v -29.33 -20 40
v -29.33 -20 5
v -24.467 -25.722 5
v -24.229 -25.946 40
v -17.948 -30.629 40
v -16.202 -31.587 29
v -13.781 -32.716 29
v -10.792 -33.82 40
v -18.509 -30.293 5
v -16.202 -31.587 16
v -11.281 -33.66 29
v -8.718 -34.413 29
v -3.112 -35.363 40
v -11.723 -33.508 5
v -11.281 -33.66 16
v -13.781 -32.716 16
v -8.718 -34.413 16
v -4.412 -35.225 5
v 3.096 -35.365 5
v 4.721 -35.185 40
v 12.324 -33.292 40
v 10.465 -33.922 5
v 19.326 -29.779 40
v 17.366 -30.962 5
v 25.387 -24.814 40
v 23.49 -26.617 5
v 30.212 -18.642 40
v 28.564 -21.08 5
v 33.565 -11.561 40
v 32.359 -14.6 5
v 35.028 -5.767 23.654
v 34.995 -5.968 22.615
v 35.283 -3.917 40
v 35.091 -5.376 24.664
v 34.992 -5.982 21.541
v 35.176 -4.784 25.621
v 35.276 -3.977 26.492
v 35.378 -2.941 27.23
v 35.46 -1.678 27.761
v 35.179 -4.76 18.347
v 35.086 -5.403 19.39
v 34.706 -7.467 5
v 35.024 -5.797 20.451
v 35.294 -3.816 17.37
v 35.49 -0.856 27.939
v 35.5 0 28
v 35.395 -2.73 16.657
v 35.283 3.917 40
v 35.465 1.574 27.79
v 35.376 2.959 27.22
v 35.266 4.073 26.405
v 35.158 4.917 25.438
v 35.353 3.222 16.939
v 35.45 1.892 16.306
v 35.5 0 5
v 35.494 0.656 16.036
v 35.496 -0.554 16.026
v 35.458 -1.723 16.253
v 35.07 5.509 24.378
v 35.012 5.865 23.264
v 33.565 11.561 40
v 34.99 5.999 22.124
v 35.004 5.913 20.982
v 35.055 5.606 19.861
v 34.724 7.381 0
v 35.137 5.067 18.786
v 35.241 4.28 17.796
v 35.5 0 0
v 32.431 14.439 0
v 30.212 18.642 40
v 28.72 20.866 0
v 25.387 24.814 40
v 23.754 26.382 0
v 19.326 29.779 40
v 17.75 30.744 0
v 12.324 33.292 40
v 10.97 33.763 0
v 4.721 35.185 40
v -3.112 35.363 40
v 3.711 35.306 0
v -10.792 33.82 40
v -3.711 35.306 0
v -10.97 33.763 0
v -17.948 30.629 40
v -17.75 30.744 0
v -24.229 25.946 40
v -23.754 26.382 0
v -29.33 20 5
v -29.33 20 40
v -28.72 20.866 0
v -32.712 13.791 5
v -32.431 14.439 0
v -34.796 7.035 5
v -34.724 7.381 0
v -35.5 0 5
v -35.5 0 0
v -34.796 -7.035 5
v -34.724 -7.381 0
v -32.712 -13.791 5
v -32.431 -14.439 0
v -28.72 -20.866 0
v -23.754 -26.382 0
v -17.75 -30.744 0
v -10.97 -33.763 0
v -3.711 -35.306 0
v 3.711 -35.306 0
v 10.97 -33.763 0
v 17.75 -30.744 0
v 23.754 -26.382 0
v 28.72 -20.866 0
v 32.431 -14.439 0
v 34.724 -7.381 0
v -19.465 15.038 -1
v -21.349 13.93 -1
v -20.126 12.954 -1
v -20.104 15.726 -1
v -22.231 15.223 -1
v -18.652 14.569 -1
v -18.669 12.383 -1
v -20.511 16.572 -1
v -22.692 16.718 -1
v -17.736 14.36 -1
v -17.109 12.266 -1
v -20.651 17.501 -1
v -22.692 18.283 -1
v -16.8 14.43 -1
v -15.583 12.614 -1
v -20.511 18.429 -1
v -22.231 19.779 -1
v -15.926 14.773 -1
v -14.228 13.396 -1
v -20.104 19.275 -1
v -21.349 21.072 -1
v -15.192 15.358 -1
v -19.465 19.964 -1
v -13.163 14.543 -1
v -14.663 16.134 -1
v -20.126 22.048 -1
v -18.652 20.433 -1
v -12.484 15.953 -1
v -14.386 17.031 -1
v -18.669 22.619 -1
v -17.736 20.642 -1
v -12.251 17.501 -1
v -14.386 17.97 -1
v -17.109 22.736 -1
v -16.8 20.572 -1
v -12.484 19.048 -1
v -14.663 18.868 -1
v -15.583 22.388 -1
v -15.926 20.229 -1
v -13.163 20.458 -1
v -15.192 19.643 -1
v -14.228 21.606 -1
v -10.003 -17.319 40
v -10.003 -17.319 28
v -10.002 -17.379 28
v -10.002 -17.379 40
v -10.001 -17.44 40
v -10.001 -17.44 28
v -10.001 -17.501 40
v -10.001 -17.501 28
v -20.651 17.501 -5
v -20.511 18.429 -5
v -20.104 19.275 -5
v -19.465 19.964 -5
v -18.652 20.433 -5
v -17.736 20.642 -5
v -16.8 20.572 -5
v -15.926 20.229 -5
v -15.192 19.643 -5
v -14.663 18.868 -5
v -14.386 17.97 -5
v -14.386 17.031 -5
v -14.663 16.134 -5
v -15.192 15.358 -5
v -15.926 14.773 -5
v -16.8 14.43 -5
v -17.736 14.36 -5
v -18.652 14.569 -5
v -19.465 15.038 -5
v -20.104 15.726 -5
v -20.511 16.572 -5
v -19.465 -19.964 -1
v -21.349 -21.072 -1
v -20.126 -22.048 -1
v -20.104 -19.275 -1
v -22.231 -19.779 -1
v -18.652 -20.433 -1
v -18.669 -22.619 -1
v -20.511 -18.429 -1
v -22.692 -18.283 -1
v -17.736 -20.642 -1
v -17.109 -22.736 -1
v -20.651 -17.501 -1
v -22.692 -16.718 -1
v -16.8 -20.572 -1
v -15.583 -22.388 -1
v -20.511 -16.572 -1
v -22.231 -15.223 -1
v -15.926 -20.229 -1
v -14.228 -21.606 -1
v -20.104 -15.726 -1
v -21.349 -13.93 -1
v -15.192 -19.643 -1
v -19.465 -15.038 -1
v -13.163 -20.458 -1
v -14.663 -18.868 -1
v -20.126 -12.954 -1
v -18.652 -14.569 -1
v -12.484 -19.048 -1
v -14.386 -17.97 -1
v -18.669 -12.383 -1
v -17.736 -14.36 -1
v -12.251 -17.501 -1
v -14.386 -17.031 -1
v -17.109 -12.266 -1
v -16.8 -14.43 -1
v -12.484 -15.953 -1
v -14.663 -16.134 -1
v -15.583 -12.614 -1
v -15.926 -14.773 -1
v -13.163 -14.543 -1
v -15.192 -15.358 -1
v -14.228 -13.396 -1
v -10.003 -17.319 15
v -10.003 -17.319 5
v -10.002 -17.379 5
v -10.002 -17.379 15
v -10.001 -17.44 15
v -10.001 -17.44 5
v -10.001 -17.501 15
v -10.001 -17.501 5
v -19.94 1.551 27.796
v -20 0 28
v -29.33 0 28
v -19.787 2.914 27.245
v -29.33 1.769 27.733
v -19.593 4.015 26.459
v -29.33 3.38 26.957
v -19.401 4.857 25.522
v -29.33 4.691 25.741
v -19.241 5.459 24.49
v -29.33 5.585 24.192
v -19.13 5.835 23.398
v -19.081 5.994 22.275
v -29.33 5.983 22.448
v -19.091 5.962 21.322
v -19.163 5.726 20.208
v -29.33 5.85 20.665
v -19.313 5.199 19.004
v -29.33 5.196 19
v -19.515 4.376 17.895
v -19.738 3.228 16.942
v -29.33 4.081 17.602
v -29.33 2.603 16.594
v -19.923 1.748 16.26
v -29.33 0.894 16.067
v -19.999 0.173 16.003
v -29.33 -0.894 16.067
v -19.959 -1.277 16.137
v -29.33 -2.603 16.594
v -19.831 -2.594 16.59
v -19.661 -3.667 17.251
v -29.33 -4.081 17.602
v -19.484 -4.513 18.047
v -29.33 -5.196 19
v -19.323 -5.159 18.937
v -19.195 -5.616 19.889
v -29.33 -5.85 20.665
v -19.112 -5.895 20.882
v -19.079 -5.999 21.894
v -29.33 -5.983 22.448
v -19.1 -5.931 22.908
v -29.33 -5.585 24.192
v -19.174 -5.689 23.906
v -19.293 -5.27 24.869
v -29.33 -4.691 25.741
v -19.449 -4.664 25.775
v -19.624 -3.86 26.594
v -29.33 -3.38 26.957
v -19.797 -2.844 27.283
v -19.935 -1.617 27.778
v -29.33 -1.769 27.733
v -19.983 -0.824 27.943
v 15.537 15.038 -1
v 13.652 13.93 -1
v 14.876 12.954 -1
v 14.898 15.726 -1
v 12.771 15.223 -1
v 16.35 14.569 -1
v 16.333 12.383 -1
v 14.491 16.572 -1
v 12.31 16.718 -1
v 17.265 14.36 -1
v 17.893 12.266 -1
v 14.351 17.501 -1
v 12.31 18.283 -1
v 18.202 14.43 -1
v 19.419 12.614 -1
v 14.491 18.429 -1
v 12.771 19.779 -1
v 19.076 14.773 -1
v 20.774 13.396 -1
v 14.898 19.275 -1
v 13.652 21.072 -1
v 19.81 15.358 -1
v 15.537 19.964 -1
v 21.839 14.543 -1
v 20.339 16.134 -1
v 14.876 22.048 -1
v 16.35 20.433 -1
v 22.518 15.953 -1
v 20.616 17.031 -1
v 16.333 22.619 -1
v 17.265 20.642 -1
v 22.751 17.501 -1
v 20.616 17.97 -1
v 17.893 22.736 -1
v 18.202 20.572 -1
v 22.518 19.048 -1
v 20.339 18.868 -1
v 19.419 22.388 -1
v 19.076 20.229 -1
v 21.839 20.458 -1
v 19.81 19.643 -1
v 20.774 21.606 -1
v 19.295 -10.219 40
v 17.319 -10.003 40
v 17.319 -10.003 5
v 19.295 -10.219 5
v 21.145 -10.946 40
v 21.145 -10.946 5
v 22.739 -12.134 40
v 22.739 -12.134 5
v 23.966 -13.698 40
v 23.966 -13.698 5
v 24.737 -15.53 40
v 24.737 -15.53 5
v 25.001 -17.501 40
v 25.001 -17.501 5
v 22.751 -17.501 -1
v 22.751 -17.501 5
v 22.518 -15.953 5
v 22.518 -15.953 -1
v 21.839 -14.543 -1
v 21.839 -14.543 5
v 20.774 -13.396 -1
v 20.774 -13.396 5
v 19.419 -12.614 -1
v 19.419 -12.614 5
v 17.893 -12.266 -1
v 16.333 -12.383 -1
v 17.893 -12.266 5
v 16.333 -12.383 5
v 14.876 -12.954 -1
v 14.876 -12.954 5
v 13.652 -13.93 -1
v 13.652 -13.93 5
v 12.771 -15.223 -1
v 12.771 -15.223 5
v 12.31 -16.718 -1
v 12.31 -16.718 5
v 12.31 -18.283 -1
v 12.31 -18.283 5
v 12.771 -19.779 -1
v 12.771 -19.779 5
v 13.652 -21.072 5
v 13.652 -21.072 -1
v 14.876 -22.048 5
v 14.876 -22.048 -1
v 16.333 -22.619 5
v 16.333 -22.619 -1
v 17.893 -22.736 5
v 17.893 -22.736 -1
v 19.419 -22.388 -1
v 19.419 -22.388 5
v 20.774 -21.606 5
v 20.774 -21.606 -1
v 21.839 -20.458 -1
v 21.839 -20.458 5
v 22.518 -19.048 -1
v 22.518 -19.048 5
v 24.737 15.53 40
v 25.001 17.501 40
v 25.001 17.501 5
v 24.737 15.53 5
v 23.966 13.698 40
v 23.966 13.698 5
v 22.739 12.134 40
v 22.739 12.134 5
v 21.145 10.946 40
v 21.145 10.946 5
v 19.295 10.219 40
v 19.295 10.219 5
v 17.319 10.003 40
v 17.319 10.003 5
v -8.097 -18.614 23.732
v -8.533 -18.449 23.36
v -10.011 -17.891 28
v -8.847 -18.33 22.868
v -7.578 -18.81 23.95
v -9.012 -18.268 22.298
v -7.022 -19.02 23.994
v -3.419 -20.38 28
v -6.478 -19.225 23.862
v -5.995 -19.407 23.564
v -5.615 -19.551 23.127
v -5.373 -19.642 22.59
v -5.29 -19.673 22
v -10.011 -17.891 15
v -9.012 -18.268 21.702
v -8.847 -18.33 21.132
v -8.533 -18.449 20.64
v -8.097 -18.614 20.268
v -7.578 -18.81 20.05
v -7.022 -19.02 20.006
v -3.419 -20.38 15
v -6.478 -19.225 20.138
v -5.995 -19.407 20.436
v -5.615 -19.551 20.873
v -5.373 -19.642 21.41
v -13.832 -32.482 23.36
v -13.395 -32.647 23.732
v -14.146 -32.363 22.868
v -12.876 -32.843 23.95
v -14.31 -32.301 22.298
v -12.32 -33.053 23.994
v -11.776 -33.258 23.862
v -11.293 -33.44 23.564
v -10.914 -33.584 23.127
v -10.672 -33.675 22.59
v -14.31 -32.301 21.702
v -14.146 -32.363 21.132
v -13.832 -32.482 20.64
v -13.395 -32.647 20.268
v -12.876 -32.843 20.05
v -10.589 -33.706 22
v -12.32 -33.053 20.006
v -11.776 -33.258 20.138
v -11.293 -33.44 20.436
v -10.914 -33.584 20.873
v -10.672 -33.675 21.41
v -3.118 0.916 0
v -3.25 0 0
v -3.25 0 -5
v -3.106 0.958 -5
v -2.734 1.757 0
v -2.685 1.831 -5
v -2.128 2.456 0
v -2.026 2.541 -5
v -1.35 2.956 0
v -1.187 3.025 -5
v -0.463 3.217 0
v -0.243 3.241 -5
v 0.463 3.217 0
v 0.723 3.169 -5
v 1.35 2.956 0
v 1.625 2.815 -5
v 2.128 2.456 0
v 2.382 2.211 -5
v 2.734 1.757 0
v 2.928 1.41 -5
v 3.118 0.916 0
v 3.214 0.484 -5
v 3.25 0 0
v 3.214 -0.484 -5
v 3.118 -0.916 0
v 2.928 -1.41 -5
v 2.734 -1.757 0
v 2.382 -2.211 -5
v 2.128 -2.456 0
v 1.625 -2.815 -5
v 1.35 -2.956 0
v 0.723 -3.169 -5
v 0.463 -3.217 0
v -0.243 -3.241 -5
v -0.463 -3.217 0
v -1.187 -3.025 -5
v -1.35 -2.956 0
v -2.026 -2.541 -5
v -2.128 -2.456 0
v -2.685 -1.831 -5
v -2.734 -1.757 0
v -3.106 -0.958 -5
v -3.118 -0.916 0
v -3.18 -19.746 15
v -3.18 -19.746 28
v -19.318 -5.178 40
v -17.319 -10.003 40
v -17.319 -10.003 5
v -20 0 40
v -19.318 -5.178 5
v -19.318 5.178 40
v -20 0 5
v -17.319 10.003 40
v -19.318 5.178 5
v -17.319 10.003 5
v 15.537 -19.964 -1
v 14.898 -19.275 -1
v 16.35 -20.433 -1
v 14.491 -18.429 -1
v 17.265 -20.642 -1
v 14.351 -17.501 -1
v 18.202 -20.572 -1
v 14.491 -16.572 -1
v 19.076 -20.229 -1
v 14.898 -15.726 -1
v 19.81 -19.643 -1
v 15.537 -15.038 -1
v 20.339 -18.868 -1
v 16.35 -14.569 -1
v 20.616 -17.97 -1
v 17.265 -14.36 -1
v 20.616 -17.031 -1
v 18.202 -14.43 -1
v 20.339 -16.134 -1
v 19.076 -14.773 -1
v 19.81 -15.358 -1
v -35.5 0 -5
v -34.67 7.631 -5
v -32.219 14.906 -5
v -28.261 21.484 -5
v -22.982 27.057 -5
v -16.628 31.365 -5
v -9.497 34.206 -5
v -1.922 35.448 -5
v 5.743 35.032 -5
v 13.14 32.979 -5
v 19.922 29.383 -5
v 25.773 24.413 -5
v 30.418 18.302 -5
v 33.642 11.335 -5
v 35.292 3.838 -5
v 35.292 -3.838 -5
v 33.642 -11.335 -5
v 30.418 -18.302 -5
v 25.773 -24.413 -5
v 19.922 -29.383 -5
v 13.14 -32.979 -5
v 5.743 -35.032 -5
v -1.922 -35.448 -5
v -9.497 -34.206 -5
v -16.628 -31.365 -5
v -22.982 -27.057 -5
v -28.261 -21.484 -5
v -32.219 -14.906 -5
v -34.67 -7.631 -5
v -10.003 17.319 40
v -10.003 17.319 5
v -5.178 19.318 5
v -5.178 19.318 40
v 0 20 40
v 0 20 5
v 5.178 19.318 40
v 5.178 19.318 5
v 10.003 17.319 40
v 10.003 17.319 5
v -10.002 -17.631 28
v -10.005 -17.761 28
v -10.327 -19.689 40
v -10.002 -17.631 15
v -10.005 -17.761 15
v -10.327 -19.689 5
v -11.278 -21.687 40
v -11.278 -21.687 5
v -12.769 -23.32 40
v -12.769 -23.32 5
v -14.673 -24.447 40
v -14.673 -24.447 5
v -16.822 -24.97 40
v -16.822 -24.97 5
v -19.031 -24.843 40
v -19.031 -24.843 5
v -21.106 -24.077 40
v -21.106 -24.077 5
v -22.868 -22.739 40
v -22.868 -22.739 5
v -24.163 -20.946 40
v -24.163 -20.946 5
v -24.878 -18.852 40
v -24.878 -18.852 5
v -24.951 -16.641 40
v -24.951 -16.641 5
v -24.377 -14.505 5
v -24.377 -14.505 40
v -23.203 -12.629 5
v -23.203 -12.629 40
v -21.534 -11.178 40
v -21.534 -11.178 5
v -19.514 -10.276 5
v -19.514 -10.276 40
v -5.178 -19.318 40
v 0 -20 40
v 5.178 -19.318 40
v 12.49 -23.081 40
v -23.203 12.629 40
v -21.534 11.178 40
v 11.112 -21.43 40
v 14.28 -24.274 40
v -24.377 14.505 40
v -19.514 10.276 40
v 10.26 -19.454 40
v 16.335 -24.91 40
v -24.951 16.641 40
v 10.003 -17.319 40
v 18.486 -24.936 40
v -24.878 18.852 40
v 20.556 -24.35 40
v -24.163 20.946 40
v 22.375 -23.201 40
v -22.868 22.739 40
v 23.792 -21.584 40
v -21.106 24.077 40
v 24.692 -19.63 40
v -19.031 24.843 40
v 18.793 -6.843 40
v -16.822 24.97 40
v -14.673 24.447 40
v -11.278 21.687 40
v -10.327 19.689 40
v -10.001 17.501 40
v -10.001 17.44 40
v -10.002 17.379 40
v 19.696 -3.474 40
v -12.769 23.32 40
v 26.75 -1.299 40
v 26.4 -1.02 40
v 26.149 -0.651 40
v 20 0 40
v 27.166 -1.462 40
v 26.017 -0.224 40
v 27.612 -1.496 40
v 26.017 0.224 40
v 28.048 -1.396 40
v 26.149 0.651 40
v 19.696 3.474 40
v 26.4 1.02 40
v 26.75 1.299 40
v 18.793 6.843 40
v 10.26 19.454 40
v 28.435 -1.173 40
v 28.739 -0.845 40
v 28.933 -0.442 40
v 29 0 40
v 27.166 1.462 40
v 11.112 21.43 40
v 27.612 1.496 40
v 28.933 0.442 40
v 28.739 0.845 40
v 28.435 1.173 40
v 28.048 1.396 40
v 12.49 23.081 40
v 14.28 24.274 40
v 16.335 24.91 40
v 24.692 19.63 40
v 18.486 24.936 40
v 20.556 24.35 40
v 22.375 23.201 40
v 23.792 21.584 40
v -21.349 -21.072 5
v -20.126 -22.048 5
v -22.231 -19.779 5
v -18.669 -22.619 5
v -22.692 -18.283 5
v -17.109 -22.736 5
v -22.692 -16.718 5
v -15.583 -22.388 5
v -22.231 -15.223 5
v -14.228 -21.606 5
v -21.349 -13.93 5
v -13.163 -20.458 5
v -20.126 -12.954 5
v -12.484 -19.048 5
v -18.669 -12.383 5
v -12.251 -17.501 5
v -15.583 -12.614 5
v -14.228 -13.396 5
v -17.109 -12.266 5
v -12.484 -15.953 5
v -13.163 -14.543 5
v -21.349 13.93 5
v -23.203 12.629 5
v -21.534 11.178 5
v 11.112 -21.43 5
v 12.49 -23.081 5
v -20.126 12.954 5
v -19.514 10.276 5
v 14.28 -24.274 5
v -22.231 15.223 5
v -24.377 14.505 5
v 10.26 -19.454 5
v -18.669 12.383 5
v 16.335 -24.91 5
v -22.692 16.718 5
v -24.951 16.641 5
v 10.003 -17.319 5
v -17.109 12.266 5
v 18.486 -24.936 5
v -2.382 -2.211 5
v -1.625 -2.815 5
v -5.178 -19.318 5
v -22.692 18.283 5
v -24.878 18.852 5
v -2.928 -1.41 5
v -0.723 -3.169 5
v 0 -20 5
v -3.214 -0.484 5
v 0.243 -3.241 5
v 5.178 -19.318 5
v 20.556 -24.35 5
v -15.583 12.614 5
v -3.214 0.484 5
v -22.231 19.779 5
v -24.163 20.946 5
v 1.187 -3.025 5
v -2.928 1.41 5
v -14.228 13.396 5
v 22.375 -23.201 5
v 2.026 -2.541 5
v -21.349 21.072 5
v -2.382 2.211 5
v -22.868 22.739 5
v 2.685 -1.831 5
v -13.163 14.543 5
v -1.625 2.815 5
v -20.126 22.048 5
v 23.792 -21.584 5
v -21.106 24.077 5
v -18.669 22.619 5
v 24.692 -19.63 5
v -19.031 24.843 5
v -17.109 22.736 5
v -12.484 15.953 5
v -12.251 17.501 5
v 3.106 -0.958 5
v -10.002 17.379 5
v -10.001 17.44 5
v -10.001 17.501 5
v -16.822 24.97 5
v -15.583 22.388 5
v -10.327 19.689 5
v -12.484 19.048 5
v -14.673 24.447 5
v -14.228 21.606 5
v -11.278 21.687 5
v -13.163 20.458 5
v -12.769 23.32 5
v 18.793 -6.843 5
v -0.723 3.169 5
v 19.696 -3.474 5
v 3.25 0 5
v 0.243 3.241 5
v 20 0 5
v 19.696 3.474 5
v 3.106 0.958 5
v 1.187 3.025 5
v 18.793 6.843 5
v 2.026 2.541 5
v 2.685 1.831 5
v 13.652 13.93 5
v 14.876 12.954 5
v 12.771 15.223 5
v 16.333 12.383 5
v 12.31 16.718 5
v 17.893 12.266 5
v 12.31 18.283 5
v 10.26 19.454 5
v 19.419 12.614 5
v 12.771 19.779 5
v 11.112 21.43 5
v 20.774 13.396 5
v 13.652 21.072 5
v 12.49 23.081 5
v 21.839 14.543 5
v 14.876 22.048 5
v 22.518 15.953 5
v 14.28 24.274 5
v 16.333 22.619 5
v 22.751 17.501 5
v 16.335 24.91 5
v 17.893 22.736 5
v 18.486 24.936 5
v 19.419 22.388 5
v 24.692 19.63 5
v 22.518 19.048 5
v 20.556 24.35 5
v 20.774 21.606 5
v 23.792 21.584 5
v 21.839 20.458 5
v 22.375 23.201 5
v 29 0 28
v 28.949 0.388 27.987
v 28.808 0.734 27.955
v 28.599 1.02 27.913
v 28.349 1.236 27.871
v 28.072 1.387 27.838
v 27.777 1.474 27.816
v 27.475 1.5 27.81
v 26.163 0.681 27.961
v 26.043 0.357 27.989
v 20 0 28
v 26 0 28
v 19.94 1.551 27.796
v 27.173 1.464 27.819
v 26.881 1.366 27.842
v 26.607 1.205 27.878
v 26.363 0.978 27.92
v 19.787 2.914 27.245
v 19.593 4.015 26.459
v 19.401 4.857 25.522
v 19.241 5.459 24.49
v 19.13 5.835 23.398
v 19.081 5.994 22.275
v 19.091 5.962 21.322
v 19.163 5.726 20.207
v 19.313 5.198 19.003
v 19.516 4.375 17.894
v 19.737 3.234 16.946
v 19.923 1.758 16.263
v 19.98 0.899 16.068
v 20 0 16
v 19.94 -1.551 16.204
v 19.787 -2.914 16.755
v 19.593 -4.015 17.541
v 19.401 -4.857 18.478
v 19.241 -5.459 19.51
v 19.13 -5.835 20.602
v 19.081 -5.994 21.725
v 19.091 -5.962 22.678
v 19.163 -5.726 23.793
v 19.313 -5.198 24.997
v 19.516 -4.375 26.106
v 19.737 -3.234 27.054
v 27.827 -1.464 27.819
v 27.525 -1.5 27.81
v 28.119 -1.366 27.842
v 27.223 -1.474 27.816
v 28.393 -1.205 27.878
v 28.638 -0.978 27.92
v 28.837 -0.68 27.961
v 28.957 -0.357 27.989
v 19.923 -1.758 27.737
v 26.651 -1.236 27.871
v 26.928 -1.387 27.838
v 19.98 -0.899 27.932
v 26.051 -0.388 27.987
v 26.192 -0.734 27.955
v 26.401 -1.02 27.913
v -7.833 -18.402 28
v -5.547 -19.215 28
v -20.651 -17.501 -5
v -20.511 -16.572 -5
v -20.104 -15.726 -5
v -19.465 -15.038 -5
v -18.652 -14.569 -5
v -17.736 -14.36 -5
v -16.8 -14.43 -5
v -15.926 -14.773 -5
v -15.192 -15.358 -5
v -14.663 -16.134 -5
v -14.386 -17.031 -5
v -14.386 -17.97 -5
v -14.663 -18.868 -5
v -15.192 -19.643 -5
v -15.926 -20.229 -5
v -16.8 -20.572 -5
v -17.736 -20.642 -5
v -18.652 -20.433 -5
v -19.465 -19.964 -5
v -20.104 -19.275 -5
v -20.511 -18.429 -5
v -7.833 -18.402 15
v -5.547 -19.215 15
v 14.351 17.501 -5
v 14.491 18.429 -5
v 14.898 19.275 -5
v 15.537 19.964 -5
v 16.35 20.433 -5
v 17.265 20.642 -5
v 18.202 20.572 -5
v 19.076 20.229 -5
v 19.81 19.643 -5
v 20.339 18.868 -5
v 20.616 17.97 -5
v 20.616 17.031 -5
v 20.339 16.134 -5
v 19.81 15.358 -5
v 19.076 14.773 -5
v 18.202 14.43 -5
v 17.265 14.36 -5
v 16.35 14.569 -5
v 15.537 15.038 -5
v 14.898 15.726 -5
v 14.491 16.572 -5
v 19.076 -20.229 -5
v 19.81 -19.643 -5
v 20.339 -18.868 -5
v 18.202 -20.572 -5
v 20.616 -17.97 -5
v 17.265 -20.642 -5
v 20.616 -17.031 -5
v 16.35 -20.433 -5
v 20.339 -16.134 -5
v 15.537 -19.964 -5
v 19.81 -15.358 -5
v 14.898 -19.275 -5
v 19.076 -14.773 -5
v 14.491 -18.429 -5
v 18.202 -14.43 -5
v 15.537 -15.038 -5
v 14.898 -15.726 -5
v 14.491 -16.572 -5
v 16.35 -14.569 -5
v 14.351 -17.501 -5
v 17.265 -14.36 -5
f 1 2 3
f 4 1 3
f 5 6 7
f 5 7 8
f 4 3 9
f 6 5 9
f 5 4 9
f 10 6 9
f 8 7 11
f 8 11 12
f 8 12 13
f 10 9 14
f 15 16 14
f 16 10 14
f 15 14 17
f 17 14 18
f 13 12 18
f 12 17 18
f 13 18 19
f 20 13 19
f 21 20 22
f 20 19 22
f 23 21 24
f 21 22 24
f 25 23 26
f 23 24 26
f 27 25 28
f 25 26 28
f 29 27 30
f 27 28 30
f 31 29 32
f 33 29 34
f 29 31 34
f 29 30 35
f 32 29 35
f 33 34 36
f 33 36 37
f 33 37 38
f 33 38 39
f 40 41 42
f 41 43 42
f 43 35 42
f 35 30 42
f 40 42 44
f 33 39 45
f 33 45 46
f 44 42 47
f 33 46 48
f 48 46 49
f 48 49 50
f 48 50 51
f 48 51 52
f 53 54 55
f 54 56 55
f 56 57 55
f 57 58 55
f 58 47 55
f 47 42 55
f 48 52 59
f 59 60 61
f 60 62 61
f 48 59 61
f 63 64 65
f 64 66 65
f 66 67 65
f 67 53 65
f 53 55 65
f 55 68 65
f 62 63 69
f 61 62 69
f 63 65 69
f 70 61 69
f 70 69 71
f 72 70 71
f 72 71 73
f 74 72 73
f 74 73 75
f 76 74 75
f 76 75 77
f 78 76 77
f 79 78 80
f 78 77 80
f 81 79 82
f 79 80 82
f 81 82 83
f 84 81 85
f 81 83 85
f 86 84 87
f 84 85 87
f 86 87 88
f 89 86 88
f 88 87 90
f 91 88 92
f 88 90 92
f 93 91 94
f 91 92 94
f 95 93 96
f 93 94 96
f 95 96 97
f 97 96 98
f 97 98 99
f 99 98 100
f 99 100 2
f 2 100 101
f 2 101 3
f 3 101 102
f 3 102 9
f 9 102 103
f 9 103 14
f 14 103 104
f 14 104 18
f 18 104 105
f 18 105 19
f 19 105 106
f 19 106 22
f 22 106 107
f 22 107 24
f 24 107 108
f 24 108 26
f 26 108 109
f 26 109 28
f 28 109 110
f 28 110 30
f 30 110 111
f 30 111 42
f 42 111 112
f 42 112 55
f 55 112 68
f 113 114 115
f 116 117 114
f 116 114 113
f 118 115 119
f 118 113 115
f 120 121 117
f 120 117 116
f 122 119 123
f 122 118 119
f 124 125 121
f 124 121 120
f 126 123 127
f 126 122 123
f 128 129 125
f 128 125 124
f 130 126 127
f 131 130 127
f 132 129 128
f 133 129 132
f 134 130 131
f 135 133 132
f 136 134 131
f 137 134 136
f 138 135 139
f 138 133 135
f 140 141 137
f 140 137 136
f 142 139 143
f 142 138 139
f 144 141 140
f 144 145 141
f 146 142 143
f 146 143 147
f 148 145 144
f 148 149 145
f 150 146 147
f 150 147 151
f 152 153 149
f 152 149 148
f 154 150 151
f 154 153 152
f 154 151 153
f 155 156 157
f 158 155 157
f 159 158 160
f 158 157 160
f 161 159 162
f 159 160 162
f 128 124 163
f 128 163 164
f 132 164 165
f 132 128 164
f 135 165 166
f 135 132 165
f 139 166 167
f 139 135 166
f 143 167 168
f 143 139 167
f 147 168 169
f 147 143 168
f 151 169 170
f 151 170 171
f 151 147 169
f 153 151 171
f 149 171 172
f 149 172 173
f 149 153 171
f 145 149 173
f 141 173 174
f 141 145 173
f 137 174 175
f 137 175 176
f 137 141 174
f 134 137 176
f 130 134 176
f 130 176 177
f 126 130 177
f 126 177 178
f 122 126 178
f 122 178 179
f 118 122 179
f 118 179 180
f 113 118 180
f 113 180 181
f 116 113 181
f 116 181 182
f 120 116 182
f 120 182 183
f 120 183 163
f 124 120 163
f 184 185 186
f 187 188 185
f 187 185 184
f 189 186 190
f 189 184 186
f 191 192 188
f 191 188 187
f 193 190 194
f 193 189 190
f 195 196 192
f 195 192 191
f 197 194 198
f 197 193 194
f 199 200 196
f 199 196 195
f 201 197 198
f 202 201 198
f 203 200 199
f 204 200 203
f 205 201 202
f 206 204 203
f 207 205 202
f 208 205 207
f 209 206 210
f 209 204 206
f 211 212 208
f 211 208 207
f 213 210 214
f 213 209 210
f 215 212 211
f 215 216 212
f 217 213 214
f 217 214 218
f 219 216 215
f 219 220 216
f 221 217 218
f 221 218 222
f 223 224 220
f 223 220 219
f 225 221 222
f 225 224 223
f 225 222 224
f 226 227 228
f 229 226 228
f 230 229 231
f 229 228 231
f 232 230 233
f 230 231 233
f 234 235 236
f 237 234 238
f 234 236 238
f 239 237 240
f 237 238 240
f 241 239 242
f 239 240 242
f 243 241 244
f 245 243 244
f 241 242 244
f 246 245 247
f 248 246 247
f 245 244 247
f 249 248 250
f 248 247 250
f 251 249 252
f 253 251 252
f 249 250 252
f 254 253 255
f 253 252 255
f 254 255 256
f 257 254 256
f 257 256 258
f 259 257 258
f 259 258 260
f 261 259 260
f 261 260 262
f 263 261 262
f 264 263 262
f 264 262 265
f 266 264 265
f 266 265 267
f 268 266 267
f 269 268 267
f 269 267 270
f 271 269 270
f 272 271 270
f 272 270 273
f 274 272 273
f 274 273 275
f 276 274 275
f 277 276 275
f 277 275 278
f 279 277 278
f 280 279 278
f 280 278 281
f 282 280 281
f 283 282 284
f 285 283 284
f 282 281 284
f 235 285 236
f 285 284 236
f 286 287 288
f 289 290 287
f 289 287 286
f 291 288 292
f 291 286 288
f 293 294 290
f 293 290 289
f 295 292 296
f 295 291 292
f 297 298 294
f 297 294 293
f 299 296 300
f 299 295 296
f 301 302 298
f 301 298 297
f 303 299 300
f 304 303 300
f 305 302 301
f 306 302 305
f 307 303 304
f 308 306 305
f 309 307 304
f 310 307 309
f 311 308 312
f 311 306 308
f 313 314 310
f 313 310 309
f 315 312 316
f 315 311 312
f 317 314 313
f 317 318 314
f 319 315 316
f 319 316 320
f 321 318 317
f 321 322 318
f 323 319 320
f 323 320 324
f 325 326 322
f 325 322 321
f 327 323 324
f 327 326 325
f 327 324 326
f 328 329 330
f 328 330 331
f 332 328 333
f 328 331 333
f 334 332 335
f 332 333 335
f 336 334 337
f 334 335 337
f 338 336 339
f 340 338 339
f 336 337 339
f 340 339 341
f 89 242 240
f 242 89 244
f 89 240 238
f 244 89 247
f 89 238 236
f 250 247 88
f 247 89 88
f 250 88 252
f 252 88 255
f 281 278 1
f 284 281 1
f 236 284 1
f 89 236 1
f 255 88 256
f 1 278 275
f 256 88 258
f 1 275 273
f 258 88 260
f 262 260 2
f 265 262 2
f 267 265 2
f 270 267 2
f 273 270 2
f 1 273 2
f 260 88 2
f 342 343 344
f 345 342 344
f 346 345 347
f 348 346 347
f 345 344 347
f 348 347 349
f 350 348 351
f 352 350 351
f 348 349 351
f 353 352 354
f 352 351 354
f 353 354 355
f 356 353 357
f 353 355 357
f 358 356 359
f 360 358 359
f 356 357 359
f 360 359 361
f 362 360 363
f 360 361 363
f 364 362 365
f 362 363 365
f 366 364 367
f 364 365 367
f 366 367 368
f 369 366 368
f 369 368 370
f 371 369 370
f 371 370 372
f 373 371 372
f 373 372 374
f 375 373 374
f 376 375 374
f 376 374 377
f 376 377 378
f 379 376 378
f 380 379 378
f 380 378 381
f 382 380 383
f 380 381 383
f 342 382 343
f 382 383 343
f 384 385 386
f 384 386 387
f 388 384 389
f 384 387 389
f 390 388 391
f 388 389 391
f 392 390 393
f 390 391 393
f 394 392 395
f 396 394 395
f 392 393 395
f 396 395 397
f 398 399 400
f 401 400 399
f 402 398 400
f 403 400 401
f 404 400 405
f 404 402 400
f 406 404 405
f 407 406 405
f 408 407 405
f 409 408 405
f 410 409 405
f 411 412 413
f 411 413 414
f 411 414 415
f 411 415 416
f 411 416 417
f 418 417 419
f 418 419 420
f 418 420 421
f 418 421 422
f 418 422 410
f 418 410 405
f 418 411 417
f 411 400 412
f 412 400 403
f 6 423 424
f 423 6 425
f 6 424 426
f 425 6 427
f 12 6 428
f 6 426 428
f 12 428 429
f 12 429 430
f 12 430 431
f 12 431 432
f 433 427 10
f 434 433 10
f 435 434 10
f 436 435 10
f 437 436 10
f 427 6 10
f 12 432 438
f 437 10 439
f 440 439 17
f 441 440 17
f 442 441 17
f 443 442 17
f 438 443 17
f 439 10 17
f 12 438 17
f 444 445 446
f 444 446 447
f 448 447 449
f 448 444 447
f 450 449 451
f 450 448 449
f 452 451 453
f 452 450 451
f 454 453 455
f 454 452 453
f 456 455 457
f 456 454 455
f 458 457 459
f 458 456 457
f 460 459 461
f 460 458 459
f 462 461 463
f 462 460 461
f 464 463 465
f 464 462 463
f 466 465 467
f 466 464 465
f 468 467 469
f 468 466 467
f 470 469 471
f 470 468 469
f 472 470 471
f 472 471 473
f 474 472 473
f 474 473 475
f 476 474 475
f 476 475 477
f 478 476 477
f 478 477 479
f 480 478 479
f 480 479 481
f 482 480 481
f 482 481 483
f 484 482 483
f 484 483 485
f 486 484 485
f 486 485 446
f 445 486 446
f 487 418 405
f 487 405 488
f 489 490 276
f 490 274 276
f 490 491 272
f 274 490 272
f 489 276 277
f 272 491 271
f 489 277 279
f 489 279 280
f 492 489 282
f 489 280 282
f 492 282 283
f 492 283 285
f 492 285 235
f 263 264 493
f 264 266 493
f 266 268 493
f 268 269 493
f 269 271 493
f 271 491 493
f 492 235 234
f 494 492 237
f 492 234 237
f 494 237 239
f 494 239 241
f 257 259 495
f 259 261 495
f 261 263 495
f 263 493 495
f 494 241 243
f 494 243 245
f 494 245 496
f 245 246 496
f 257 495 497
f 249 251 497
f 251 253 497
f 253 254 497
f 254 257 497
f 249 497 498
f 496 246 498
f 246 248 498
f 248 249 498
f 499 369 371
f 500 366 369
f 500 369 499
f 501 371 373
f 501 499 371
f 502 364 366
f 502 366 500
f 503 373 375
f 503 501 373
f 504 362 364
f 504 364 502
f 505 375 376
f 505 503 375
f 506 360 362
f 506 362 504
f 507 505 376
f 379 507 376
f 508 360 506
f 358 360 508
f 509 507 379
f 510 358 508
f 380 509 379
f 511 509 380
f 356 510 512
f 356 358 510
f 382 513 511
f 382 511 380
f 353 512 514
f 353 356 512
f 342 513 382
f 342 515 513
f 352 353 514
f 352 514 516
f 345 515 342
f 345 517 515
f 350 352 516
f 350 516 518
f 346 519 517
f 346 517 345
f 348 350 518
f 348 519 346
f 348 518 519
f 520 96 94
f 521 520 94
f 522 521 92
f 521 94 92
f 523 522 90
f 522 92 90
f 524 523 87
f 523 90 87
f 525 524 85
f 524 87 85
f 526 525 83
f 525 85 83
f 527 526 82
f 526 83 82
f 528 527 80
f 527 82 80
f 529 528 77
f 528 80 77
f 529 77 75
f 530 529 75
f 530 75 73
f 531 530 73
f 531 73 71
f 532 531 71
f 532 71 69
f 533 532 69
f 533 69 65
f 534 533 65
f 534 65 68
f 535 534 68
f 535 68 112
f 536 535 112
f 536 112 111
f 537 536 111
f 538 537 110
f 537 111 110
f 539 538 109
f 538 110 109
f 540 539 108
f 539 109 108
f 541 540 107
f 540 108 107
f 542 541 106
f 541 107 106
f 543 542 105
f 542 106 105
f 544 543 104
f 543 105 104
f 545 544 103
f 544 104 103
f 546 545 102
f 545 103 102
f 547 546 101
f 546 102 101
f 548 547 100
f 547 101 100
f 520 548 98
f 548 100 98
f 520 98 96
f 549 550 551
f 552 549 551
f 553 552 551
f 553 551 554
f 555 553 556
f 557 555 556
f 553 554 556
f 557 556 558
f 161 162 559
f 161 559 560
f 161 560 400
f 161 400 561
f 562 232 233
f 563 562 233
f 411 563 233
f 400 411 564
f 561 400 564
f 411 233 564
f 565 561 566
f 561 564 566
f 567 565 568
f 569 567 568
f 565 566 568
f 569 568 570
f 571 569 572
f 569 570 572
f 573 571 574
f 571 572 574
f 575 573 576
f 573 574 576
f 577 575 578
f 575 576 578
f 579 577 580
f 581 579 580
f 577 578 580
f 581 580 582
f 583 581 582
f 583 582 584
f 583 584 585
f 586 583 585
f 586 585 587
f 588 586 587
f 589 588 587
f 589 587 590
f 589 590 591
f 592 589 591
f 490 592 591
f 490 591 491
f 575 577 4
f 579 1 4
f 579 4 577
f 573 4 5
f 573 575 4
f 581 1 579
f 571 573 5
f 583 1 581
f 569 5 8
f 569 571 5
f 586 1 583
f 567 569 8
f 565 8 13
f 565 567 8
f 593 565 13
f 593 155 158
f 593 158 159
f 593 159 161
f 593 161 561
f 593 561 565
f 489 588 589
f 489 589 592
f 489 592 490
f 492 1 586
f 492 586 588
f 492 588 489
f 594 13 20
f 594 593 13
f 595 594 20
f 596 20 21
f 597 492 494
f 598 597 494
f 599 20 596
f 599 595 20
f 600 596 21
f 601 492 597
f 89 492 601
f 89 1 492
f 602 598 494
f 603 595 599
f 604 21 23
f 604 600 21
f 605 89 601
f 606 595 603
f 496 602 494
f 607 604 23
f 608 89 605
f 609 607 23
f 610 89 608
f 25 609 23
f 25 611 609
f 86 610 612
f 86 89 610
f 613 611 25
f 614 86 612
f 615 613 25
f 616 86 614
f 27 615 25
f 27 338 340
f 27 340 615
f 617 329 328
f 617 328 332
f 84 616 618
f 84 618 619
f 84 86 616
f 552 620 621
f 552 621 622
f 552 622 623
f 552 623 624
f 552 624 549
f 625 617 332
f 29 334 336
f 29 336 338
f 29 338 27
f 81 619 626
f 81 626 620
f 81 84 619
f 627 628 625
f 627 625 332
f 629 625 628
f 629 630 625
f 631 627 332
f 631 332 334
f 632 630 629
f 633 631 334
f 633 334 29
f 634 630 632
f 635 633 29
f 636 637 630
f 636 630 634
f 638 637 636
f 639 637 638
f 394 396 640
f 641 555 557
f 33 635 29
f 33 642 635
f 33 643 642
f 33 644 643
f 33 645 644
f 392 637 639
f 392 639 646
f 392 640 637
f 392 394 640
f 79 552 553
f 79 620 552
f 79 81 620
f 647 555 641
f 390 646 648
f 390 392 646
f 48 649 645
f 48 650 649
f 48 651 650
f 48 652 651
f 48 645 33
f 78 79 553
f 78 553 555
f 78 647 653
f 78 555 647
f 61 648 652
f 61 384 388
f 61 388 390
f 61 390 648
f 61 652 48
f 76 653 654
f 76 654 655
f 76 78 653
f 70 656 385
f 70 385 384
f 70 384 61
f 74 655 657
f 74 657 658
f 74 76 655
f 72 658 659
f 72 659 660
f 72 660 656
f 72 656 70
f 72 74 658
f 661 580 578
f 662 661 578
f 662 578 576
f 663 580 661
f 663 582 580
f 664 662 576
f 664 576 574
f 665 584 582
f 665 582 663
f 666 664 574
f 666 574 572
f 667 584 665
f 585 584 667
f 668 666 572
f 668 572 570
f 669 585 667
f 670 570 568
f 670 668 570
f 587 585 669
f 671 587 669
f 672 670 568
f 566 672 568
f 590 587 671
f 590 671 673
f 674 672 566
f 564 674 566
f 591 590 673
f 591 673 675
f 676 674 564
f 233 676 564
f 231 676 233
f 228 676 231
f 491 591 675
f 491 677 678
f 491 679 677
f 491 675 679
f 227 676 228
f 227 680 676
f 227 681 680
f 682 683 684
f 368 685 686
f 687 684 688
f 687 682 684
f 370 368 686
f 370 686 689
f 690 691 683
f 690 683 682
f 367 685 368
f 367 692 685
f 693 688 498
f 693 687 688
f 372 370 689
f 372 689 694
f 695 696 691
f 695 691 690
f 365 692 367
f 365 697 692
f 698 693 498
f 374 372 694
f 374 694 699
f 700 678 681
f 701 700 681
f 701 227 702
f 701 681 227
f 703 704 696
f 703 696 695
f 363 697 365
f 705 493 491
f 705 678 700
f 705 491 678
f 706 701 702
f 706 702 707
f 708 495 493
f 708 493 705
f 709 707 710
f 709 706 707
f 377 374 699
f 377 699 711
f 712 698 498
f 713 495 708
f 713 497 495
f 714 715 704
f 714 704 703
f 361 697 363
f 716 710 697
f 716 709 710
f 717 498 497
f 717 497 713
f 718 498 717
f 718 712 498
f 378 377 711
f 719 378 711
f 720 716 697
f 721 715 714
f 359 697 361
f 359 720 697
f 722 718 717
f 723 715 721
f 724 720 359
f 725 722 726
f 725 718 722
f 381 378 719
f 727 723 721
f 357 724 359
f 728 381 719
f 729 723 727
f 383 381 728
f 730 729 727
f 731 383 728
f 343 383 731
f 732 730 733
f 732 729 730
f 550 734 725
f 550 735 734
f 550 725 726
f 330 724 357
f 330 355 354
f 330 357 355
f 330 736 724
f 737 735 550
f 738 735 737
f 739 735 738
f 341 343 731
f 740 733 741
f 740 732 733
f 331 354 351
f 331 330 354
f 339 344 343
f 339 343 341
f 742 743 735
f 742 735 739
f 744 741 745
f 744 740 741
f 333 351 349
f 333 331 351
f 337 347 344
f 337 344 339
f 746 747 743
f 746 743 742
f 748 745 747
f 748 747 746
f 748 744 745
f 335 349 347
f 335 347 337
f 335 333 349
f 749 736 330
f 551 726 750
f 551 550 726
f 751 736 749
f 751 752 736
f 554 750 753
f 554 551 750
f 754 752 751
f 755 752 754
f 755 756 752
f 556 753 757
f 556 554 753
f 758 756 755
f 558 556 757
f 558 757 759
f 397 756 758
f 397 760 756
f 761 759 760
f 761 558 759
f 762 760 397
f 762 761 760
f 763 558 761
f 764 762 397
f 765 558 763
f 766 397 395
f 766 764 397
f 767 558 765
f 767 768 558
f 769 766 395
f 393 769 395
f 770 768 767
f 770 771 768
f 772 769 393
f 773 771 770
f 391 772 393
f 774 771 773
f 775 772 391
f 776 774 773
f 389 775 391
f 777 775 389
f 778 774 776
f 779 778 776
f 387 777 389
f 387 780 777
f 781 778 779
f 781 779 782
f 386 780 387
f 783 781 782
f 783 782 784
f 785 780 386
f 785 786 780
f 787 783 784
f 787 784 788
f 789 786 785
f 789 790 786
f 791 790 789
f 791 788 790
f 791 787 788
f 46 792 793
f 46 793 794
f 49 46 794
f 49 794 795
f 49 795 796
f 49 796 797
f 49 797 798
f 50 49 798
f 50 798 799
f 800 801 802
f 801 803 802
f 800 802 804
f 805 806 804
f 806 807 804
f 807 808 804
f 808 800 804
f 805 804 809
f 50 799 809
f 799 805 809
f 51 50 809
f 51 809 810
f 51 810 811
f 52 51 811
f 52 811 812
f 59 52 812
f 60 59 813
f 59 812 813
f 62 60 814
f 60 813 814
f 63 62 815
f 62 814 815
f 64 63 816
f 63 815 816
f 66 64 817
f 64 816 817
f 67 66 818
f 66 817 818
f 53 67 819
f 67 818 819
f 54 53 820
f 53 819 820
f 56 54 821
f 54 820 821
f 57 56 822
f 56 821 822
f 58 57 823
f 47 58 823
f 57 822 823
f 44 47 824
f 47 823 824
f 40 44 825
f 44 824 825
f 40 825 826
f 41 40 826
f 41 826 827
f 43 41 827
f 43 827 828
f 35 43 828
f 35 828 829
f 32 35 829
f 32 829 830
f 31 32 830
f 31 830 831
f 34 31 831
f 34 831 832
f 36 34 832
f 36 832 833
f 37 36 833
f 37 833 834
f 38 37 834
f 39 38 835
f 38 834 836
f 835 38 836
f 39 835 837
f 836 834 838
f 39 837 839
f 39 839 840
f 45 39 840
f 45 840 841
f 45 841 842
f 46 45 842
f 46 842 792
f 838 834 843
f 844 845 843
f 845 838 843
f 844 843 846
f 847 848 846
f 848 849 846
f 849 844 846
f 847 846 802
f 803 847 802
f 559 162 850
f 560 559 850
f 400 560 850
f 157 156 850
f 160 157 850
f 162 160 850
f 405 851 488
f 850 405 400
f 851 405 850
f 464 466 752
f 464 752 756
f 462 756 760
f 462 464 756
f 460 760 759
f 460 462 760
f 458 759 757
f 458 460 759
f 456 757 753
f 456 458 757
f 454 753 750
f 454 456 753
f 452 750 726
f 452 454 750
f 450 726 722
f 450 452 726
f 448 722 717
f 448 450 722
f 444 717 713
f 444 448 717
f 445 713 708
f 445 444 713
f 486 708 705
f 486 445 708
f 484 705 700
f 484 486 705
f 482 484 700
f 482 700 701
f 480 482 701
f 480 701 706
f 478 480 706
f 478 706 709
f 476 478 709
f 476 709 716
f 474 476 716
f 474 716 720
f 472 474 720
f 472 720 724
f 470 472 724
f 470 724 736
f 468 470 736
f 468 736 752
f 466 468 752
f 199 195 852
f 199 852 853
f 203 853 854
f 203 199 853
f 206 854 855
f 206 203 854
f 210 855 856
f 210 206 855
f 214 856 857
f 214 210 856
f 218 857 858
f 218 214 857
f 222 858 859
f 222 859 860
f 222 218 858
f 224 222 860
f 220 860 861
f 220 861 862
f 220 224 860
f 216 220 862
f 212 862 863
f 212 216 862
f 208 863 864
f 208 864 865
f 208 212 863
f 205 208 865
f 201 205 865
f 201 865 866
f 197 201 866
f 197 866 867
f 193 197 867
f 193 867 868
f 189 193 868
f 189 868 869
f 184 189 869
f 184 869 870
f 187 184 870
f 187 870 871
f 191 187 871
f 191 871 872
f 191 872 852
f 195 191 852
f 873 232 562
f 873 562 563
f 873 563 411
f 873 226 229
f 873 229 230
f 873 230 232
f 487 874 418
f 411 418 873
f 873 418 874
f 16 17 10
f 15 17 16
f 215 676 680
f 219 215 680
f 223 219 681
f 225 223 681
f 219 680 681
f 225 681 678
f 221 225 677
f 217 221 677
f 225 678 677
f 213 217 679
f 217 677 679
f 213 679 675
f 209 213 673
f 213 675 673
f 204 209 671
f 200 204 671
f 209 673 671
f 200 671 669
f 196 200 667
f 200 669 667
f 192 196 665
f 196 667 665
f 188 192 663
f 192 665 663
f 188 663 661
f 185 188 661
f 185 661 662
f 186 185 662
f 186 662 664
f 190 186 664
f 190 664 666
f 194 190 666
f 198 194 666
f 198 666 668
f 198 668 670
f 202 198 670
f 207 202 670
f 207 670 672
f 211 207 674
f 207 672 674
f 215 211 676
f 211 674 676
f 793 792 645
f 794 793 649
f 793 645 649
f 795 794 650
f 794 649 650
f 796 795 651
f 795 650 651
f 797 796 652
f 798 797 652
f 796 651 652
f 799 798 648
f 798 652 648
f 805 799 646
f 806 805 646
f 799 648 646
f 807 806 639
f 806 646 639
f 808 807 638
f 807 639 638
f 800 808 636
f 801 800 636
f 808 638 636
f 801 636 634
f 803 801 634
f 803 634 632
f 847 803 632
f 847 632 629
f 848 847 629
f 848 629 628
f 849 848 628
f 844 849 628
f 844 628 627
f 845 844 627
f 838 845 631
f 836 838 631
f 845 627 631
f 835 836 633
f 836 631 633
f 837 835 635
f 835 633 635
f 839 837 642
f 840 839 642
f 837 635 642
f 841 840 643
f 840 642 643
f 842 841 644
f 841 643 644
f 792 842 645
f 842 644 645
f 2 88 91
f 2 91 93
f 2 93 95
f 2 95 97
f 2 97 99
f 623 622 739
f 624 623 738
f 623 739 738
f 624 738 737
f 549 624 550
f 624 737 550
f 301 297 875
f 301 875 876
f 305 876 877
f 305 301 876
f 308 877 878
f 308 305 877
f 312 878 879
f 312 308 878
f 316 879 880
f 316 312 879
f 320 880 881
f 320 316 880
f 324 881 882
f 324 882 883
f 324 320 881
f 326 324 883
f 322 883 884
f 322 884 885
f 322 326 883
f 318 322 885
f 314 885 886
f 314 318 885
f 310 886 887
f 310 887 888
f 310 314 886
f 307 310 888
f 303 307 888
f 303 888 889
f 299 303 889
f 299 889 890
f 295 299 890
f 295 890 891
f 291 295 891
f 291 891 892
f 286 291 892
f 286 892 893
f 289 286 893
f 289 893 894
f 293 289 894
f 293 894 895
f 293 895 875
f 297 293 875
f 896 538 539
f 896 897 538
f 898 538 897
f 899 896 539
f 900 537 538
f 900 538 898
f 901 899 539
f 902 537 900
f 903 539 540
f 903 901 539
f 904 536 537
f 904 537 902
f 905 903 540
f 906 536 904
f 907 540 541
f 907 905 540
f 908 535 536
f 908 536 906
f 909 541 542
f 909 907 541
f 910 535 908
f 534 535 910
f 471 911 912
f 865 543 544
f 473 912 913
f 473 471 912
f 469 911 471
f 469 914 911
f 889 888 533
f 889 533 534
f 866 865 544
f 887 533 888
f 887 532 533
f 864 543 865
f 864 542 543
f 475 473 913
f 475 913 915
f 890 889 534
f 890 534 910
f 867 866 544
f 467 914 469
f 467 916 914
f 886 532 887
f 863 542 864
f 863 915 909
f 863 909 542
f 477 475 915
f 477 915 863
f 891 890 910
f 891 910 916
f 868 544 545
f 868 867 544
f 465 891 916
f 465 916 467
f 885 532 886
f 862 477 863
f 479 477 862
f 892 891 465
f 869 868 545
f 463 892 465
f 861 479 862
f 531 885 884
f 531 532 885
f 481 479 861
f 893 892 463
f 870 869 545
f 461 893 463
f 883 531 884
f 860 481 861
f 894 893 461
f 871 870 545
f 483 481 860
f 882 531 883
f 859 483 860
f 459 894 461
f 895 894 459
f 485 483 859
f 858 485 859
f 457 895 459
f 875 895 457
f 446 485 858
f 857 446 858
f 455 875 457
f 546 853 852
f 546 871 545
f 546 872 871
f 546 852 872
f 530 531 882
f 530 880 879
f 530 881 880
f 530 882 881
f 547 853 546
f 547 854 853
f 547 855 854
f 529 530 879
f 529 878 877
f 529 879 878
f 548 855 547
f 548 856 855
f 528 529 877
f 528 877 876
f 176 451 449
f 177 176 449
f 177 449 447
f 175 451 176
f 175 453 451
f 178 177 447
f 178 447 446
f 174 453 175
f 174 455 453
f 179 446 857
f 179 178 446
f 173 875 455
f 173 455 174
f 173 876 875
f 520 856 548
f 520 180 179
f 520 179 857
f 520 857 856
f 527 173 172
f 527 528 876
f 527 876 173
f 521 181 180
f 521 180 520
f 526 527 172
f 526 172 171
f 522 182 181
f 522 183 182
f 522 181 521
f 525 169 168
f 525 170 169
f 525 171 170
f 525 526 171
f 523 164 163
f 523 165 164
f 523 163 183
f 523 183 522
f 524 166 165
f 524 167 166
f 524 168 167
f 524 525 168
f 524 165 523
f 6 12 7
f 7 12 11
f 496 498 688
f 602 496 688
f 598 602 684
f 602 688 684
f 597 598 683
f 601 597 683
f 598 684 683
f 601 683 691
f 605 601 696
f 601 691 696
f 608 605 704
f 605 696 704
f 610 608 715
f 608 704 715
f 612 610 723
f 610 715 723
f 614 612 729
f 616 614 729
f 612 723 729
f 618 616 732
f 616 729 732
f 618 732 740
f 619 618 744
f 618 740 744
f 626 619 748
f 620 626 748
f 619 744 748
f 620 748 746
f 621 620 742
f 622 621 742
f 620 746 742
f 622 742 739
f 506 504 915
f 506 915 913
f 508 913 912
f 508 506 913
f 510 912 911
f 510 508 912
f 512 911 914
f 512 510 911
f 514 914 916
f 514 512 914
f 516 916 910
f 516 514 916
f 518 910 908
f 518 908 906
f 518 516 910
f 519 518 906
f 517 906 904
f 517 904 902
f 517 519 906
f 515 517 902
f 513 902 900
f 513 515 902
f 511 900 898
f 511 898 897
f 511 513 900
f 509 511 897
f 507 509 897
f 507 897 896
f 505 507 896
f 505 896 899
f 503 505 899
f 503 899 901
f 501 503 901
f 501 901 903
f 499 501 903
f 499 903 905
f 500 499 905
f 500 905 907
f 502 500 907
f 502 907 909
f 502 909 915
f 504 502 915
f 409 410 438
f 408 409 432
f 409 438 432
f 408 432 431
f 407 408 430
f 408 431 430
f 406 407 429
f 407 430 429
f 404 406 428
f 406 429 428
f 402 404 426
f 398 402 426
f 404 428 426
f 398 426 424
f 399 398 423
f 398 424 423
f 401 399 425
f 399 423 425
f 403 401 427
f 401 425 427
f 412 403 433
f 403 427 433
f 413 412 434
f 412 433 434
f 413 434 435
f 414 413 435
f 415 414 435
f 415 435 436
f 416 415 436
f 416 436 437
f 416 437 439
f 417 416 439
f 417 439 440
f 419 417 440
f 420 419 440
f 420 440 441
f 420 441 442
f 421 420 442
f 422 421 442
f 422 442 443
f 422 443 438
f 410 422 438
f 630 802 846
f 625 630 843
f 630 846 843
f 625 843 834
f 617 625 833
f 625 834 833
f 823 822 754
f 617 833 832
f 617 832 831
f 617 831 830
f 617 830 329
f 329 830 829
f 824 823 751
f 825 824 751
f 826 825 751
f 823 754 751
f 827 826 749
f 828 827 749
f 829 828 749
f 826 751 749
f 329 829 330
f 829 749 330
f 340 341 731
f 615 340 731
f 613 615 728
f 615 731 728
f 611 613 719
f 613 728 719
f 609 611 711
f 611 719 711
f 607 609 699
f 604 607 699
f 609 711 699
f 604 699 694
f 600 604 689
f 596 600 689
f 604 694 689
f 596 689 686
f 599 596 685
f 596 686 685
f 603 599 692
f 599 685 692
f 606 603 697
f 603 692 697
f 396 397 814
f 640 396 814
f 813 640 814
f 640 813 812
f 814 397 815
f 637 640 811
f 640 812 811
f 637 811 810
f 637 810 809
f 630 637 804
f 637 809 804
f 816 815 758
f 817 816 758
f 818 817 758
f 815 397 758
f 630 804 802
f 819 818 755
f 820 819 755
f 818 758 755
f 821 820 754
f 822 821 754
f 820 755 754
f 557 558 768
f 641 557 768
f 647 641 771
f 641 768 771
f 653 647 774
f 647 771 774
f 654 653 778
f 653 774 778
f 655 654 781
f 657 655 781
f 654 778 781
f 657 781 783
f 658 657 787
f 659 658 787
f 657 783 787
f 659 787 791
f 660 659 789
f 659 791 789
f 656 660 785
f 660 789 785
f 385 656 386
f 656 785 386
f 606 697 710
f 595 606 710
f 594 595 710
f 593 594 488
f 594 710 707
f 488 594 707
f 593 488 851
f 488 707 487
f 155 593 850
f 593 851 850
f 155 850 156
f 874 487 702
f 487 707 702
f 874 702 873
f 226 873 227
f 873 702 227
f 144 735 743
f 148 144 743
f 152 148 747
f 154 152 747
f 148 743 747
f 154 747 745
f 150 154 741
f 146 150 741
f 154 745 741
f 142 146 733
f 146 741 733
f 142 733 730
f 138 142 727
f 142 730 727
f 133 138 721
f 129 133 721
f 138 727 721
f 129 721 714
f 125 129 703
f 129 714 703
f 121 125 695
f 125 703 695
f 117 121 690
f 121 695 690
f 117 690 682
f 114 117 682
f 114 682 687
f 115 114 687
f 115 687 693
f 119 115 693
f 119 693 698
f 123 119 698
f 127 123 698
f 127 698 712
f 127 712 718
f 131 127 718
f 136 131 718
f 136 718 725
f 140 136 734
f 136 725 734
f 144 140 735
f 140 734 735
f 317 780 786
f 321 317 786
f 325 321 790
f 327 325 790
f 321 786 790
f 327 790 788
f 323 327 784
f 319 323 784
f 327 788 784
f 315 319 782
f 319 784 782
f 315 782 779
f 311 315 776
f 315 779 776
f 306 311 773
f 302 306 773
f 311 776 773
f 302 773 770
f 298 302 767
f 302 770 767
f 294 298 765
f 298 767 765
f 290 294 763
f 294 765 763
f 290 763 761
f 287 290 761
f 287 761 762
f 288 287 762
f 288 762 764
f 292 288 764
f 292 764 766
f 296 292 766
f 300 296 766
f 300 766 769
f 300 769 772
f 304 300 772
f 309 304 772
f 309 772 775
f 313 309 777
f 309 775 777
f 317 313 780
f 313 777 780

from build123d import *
from build123d.topology import SkipClean

# Parameters (mm, degrees)
CROQUIS1_R                   = 35.5
CROQUIS1_R_2                 = 3.25
CROQUIS1_R_3                 = 3.15
SALIENTE_EXTRUIR1_DEPTH      = 5
SALIENTE_EXTRUIR2_DEPTH      = 35
CROQUIS3_R                   = 6
CORTAR_EXTRUIR1_DEPTH        = 85.042735149
CORTAR_EXTRUIR2_REACH        = 66.191
CORTAR_EXTRUIR2_END_RADIUS   = 6
CROQUIS4_R                   = 1.5
CORTAR_EXTRUIR_L_MINA1_START = 11
CORTAR_EXTRUIR_L_MINA1_DEPTH = 13
CORTAR_EXTRUIR3_REACH        = 94.695
CORTAR_EXTRUIR3_END_RADIUS   = 20
CROQUIS6_R                   = 2
CORTAR_EXTRUIR_L_MINA2_START = 10
CORTAR_EXTRUIR_L_MINA2_DEPTH = 13
CROQUIS10_R                  = 35.5
CROQUIS10_R_2                = 3.25
CROQUIS10_R_3                = 3.15
SALIENTE_EXTRUIR4_DEPTH      = 5
CROQUIS8_R                   = 5.25
CORTAR_EXTRUIR4_DEPTH        = 6


with BuildPart() as part:
    # Croquis1 → Saliente-Extruir1 (new body)
    with BuildSketch(Plane.XY):
        Circle(CROQUIS1_R)
        Circle(CROQUIS1_R_2, mode=Mode.SUBTRACT)
        with Locations((17.500892834, 17.500892834)):
            Circle(CROQUIS1_R_3, mode=Mode.SUBTRACT)
        with Locations((17.500892834, -17.500892834)):
            Circle(CROQUIS1_R_3, mode=Mode.SUBTRACT)
        with Locations((-17.500892834, -17.500892834)):
            Circle(CROQUIS1_R_3, mode=Mode.SUBTRACT)
        with Locations((-17.500892834, 17.500892834)):
            Circle(CROQUIS1_R_3, mode=Mode.SUBTRACT)
    extrude(amount=SALIENTE_EXTRUIR1_DEPTH)

    # Croquis2 → Saliente-Extruir2 (add)
    with BuildSketch(Plane.XY.offset(5)):
        with BuildLine():
            ThreePointArc((-29.330018752, -20), (35.5, 0), (-29.330018752, 20))
            Line((-29.330018752, 20), (-29.330018752, -20))
        make_face()
        with BuildLine():
            ThreePointArc((10.003105755, 17.318714596), (17.409796995, 25.000339584), (25.000892834, 17.500892834))
            ThreePointArc((25.000892834, 17.500892834), (22.739388001, 12.133568697), (17.318714596, 10.003105755))
            ThreePointArc((17.318714596, 10.003105755), (19.318052333, 5.178112981), (20, 0))
            ThreePointArc((20, 0), (19.318052333, -5.178112981), (17.318714596, -10.003105755))
            ThreePointArc((17.318714596, -10.003105755), (22.739388001, -12.133568697), (25.000892834, -17.500892834))
            ThreePointArc((25.000892834, -17.500892834), (17.409796995, -25.000339584), (10.003105755, -17.318714596))
            ThreePointArc((10.003105755, -17.318714596), (0, -20), (-10.003105755, -17.318714596))
            ThreePointArc((-10.003105755, -17.318714596), (-10.001446085, -17.409796995), (-10.000892834, -17.500892834))
            ThreePointArc((-10.000892834, -17.500892834), (-22.868216972, -22.739388001), (-17.318714596, -10.003105755))
            ThreePointArc((-17.318714596, -10.003105755), (-20, 0), (-17.318714596, 10.003105755))
            ThreePointArc((-17.318714596, 10.003105755), (-22.868216972, 22.739388001), (-10.000892834, 17.500892834))
            ThreePointArc((-10.000892834, 17.500892834), (-10.001446085, 17.409796995), (-10.003105755, 17.318714596))
            ThreePointArc((-10.003105755, 17.318714596), (0, 20), (10.003105755, 17.318714596))
        make_face(mode=Mode.SUBTRACT)
    extrude(amount=SALIENTE_EXTRUIR2_DEPTH)

    # Croquis3 → Cortar-Extruir1 (cut, through all)
    with SkipClean():  # the faces are left unmerged after this step: merging them gives an invalid solid
        with BuildSketch(Plane.ZY.offset(29.330018752)):
            with Locations((22, 0)):
                Circle(CROQUIS3_R)
        extrude(amount=-CORTAR_EXTRUIR1_DEPTH, mode=Mode.SUBTRACT)

    # Cortar-Extruir2: up to this cylinder (the profile starts outside it)
    with SkipClean():  # the faces are left unmerged after this step: merging them gives an invalid solid
        cortar_extruir2_end = Plane(origin=(27.5, 0, 22), z_dir=(-1, 0, 0)) * Cylinder(CORTAR_EXTRUIR2_END_RADIUS, 145.382, mode=Mode.PRIVATE)
        # Croquis4 → Cortar-Extruir2 (cut, up to the surface)
        with BuildSketch(Plane.XY.offset(40), mode=Mode.PRIVATE) as cortar_extruir2_sk1:
            with Locations((27.5, 0)):
                Circle(CROQUIS4_R)
        cortar_extruir2_tool1 = extrude(cortar_extruir2_sk1.sketch, amount=-CORTAR_EXTRUIR2_REACH, mode=Mode.PRIVATE) - cortar_extruir2_end
        add(cortar_extruir2_tool1.solids().sort_by_distance((27.5, 0, 40))[0], mode=Mode.SUBTRACT)

    # Croquis5 → Cortar-Extruir-Lámina1 (cut)
    with SkipClean():  # the faces are left unmerged after this step: merging them gives an invalid solid
        with BuildSketch(Plane.XY.offset(5).offset(CORTAR_EXTRUIR_L_MINA1_START)):
            Polygon((-16.202076443, -31.58706569), (-8.717795145, -34.41293431), (-9.4242623, -36.284004634), (-16.908543598, -33.458136015), align=None)
        extrude(amount=CORTAR_EXTRUIR_L_MINA1_DEPTH, mode=Mode.SUBTRACT)

    # Cortar-Extruir3: up to this cylinder (the profile starts outside it)
    with SkipClean():  # the faces are left unmerged after this step: merging them gives an invalid solid
        cortar_extruir3_end = Plane(origin=(0, 0, 22), z_dir=(0, 0, -1)) * Cylinder(CORTAR_EXTRUIR3_END_RADIUS, 230.39, mode=Mode.PRIVATE)
        # Croquis6 → Cortar-Extruir3 (cut, up to the surface)
        with BuildSketch(Plane(origin=(-12.459935794, -33, 0), x_dir=(0.935535162237637, -0.3532335774200951, 0), z_dir=(-0.35323357742009515, -0.9355351622376371, 0)), mode=Mode.PRIVATE) as cortar_extruir3_sk1:
            with Locations((0, 22)):
                Circle(CROQUIS6_R)
        cortar_extruir3_tool1 = extrude(cortar_extruir3_sk1.sketch, amount=-CORTAR_EXTRUIR3_REACH, mode=Mode.PRIVATE) - cortar_extruir3_end
        add(cortar_extruir3_tool1.solids().sort_by_distance((-12.459936, -33, 22))[0], mode=Mode.SUBTRACT)

    # Croquis7 → Cortar-Extruir-Lámina2 (cut)
    with SkipClean():  # the faces are left unmerged after this step: merging them gives an invalid solid
        with BuildSketch(Plane.XY.offset(5).offset(CORTAR_EXTRUIR_L_MINA2_START)):
            Polygon((-10.903572782, -17.554038257), (-3.419291484, -20.379906876), (-2.712824329, -18.508836552), (-10.197105627, -15.682967932), align=None)
        extrude(amount=CORTAR_EXTRUIR_L_MINA2_DEPTH, mode=Mode.SUBTRACT)

    # Croquis10 → Saliente-Extruir4 (add)
    with SkipClean():  # the faces are left unmerged after this step: merging them gives an invalid solid
        with BuildSketch(Plane(origin=(0, 0, 0), x_dir=(-1, 0, 0), z_dir=(0, 0, -1))):
            Circle(CROQUIS10_R)
            Circle(CROQUIS10_R_2, mode=Mode.SUBTRACT)
            with Locations((-17.500892834, -17.500892834)):
                Circle(CROQUIS10_R_3, mode=Mode.SUBTRACT)
            with Locations((17.500892834, 17.500892834)):
                Circle(CROQUIS10_R_3, mode=Mode.SUBTRACT)
            with Locations((17.500892834, -17.500892834)):
                Circle(CROQUIS10_R_3, mode=Mode.SUBTRACT)
            with Locations((-17.500892834, 17.500892834)):
                Circle(CROQUIS10_R_3, mode=Mode.SUBTRACT)
        extrude(amount=SALIENTE_EXTRUIR4_DEPTH)

    # Croquis8 → Cortar-Extruir4 (cut)
    with SkipClean():  # the faces are left unmerged after this step: merging them gives an invalid solid
        with BuildSketch(Plane.XY.offset(5)):
            with Locations((-17.500892834, -17.500892834)):
                Circle(CROQUIS8_R)
            with Locations((-17.500892834, 17.500892834)):
                Circle(CROQUIS8_R)
            with Locations((17.500892834, 17.500892834)):
                Circle(CROQUIS8_R)
            with Locations((17.500892834, -17.500892834)):
                Circle(CROQUIS8_R)
        extrude(amount=-CORTAR_EXTRUIR4_DEPTH, mode=Mode.SUBTRACT)


solid = part.part
